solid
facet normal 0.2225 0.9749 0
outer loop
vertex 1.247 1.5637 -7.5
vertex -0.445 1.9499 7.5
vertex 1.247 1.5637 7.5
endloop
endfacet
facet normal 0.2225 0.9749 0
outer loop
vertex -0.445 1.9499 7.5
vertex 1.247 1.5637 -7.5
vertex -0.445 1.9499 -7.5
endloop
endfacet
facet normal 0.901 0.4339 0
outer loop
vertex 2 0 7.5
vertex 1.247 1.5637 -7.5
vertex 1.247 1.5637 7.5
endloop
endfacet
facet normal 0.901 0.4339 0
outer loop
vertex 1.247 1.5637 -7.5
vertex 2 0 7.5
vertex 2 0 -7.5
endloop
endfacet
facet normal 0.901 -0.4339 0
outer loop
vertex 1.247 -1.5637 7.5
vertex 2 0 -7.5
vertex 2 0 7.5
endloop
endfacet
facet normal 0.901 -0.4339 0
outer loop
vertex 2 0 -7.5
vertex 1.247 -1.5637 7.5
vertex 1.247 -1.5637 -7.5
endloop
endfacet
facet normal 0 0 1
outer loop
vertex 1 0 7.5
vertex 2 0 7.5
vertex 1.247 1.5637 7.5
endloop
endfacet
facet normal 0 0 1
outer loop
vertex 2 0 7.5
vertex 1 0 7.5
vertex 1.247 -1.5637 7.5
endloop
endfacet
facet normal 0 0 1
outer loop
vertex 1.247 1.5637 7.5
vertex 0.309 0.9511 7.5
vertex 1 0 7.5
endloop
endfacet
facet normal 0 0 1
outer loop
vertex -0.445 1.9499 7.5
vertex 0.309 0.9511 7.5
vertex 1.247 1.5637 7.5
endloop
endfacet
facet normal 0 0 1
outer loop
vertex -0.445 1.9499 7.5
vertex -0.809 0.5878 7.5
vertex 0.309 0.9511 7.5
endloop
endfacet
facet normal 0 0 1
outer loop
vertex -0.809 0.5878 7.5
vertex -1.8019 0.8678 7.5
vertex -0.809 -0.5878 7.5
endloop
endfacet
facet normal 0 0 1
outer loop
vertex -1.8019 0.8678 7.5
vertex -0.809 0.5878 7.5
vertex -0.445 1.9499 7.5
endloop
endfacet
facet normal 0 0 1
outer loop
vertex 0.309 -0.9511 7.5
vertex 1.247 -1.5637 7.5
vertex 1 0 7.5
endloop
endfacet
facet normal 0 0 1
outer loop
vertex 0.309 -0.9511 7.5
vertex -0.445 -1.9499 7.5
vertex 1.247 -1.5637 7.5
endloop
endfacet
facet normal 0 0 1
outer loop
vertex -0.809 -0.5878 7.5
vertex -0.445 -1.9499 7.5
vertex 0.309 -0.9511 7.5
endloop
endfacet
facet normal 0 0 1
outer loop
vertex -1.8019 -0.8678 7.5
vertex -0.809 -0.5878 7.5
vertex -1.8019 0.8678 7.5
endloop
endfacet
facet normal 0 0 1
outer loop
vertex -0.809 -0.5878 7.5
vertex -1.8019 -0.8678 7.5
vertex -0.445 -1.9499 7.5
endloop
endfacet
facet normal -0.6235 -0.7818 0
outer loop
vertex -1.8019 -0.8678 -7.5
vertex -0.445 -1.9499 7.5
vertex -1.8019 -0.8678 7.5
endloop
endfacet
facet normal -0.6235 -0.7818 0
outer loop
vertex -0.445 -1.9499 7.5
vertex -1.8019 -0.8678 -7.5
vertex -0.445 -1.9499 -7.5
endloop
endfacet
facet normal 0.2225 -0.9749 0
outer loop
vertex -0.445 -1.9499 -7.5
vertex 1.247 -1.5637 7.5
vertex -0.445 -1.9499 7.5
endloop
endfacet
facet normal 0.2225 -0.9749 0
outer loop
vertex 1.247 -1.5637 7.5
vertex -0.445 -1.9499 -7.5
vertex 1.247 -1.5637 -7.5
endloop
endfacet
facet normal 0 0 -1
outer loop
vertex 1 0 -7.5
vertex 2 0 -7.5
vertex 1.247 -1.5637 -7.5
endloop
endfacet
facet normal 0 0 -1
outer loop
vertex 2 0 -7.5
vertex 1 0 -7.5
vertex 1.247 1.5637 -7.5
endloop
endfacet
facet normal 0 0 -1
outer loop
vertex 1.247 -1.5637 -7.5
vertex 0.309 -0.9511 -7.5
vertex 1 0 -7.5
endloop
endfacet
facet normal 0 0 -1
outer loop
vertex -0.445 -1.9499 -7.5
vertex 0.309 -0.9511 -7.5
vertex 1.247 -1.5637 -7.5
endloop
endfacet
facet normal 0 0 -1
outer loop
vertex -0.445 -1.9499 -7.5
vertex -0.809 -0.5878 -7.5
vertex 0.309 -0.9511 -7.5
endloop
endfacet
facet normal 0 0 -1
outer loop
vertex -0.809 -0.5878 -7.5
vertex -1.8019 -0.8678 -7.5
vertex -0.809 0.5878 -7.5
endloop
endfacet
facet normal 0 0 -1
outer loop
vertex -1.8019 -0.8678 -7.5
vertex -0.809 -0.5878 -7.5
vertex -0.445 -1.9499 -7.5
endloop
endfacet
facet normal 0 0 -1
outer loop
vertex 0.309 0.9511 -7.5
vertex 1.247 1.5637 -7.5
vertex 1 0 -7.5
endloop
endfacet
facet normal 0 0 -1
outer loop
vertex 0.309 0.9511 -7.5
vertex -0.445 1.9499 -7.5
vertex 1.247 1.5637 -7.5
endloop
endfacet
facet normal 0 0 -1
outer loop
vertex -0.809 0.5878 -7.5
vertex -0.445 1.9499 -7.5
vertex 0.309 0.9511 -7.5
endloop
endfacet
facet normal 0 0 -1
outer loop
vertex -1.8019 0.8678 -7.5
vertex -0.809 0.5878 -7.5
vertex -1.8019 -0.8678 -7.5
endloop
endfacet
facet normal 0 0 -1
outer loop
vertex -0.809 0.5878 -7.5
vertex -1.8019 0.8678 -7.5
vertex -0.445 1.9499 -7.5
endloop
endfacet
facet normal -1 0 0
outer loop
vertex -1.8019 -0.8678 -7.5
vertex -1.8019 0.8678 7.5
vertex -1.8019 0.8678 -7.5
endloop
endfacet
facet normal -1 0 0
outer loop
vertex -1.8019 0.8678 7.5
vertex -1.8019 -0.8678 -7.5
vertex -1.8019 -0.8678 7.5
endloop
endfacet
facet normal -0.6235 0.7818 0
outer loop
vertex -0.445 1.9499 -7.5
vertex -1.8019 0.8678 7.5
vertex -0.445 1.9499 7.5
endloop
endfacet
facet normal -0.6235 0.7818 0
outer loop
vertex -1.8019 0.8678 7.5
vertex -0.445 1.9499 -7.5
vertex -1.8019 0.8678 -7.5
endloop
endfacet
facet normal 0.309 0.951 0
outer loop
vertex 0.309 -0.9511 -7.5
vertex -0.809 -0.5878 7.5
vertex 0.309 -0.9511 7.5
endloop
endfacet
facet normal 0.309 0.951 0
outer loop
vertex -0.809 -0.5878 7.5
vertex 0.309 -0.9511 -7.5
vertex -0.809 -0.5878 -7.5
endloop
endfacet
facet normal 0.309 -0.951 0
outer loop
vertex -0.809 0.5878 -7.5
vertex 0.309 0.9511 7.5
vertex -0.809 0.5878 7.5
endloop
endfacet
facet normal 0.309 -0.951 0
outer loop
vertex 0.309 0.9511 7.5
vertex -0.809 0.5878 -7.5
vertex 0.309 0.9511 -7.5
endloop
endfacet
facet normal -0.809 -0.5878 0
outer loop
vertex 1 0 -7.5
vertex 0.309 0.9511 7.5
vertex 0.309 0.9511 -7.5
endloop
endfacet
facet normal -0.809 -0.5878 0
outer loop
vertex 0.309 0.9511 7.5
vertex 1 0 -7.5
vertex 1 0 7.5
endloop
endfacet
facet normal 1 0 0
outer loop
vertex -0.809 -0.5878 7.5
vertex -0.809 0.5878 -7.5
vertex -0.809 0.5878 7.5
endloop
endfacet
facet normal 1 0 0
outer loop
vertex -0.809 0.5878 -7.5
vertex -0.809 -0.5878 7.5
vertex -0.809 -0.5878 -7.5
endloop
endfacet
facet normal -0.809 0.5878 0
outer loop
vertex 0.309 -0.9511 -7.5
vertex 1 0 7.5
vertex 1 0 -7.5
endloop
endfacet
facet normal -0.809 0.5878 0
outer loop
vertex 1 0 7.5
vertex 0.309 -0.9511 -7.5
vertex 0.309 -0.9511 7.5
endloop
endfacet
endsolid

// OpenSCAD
// Parameters
length = 15; //[8:30:1]
forced_id = 0; //[0:10:0.1]
center = 1; //[0:1:1]
tubing_od = 4; //[2:8:0.1]
tubing_id = 2; //[1:6:0.1]
eps_overlap = 0.5; //[0.1:2:0.1]

// Tubing - complete geometry
module tubing() {
  color([0.85, 0.85, 0.8]) { // Off-white for PTFE
    difference() {
      // Outer cylinder
      cylinder(h=length, r=tubing_od/2, center=true);
      // Inner cylinder
      cylinder(h=length + 2*eps_overlap, r=(forced_id > 0 ? forced_id : tubing_id)/2, center=true);
    }
  }
}

// Assembly
module assembly() {
  translate([0, 0, (center == 1) ? 0 : (length/2)]) tubing();
}

assembly();
